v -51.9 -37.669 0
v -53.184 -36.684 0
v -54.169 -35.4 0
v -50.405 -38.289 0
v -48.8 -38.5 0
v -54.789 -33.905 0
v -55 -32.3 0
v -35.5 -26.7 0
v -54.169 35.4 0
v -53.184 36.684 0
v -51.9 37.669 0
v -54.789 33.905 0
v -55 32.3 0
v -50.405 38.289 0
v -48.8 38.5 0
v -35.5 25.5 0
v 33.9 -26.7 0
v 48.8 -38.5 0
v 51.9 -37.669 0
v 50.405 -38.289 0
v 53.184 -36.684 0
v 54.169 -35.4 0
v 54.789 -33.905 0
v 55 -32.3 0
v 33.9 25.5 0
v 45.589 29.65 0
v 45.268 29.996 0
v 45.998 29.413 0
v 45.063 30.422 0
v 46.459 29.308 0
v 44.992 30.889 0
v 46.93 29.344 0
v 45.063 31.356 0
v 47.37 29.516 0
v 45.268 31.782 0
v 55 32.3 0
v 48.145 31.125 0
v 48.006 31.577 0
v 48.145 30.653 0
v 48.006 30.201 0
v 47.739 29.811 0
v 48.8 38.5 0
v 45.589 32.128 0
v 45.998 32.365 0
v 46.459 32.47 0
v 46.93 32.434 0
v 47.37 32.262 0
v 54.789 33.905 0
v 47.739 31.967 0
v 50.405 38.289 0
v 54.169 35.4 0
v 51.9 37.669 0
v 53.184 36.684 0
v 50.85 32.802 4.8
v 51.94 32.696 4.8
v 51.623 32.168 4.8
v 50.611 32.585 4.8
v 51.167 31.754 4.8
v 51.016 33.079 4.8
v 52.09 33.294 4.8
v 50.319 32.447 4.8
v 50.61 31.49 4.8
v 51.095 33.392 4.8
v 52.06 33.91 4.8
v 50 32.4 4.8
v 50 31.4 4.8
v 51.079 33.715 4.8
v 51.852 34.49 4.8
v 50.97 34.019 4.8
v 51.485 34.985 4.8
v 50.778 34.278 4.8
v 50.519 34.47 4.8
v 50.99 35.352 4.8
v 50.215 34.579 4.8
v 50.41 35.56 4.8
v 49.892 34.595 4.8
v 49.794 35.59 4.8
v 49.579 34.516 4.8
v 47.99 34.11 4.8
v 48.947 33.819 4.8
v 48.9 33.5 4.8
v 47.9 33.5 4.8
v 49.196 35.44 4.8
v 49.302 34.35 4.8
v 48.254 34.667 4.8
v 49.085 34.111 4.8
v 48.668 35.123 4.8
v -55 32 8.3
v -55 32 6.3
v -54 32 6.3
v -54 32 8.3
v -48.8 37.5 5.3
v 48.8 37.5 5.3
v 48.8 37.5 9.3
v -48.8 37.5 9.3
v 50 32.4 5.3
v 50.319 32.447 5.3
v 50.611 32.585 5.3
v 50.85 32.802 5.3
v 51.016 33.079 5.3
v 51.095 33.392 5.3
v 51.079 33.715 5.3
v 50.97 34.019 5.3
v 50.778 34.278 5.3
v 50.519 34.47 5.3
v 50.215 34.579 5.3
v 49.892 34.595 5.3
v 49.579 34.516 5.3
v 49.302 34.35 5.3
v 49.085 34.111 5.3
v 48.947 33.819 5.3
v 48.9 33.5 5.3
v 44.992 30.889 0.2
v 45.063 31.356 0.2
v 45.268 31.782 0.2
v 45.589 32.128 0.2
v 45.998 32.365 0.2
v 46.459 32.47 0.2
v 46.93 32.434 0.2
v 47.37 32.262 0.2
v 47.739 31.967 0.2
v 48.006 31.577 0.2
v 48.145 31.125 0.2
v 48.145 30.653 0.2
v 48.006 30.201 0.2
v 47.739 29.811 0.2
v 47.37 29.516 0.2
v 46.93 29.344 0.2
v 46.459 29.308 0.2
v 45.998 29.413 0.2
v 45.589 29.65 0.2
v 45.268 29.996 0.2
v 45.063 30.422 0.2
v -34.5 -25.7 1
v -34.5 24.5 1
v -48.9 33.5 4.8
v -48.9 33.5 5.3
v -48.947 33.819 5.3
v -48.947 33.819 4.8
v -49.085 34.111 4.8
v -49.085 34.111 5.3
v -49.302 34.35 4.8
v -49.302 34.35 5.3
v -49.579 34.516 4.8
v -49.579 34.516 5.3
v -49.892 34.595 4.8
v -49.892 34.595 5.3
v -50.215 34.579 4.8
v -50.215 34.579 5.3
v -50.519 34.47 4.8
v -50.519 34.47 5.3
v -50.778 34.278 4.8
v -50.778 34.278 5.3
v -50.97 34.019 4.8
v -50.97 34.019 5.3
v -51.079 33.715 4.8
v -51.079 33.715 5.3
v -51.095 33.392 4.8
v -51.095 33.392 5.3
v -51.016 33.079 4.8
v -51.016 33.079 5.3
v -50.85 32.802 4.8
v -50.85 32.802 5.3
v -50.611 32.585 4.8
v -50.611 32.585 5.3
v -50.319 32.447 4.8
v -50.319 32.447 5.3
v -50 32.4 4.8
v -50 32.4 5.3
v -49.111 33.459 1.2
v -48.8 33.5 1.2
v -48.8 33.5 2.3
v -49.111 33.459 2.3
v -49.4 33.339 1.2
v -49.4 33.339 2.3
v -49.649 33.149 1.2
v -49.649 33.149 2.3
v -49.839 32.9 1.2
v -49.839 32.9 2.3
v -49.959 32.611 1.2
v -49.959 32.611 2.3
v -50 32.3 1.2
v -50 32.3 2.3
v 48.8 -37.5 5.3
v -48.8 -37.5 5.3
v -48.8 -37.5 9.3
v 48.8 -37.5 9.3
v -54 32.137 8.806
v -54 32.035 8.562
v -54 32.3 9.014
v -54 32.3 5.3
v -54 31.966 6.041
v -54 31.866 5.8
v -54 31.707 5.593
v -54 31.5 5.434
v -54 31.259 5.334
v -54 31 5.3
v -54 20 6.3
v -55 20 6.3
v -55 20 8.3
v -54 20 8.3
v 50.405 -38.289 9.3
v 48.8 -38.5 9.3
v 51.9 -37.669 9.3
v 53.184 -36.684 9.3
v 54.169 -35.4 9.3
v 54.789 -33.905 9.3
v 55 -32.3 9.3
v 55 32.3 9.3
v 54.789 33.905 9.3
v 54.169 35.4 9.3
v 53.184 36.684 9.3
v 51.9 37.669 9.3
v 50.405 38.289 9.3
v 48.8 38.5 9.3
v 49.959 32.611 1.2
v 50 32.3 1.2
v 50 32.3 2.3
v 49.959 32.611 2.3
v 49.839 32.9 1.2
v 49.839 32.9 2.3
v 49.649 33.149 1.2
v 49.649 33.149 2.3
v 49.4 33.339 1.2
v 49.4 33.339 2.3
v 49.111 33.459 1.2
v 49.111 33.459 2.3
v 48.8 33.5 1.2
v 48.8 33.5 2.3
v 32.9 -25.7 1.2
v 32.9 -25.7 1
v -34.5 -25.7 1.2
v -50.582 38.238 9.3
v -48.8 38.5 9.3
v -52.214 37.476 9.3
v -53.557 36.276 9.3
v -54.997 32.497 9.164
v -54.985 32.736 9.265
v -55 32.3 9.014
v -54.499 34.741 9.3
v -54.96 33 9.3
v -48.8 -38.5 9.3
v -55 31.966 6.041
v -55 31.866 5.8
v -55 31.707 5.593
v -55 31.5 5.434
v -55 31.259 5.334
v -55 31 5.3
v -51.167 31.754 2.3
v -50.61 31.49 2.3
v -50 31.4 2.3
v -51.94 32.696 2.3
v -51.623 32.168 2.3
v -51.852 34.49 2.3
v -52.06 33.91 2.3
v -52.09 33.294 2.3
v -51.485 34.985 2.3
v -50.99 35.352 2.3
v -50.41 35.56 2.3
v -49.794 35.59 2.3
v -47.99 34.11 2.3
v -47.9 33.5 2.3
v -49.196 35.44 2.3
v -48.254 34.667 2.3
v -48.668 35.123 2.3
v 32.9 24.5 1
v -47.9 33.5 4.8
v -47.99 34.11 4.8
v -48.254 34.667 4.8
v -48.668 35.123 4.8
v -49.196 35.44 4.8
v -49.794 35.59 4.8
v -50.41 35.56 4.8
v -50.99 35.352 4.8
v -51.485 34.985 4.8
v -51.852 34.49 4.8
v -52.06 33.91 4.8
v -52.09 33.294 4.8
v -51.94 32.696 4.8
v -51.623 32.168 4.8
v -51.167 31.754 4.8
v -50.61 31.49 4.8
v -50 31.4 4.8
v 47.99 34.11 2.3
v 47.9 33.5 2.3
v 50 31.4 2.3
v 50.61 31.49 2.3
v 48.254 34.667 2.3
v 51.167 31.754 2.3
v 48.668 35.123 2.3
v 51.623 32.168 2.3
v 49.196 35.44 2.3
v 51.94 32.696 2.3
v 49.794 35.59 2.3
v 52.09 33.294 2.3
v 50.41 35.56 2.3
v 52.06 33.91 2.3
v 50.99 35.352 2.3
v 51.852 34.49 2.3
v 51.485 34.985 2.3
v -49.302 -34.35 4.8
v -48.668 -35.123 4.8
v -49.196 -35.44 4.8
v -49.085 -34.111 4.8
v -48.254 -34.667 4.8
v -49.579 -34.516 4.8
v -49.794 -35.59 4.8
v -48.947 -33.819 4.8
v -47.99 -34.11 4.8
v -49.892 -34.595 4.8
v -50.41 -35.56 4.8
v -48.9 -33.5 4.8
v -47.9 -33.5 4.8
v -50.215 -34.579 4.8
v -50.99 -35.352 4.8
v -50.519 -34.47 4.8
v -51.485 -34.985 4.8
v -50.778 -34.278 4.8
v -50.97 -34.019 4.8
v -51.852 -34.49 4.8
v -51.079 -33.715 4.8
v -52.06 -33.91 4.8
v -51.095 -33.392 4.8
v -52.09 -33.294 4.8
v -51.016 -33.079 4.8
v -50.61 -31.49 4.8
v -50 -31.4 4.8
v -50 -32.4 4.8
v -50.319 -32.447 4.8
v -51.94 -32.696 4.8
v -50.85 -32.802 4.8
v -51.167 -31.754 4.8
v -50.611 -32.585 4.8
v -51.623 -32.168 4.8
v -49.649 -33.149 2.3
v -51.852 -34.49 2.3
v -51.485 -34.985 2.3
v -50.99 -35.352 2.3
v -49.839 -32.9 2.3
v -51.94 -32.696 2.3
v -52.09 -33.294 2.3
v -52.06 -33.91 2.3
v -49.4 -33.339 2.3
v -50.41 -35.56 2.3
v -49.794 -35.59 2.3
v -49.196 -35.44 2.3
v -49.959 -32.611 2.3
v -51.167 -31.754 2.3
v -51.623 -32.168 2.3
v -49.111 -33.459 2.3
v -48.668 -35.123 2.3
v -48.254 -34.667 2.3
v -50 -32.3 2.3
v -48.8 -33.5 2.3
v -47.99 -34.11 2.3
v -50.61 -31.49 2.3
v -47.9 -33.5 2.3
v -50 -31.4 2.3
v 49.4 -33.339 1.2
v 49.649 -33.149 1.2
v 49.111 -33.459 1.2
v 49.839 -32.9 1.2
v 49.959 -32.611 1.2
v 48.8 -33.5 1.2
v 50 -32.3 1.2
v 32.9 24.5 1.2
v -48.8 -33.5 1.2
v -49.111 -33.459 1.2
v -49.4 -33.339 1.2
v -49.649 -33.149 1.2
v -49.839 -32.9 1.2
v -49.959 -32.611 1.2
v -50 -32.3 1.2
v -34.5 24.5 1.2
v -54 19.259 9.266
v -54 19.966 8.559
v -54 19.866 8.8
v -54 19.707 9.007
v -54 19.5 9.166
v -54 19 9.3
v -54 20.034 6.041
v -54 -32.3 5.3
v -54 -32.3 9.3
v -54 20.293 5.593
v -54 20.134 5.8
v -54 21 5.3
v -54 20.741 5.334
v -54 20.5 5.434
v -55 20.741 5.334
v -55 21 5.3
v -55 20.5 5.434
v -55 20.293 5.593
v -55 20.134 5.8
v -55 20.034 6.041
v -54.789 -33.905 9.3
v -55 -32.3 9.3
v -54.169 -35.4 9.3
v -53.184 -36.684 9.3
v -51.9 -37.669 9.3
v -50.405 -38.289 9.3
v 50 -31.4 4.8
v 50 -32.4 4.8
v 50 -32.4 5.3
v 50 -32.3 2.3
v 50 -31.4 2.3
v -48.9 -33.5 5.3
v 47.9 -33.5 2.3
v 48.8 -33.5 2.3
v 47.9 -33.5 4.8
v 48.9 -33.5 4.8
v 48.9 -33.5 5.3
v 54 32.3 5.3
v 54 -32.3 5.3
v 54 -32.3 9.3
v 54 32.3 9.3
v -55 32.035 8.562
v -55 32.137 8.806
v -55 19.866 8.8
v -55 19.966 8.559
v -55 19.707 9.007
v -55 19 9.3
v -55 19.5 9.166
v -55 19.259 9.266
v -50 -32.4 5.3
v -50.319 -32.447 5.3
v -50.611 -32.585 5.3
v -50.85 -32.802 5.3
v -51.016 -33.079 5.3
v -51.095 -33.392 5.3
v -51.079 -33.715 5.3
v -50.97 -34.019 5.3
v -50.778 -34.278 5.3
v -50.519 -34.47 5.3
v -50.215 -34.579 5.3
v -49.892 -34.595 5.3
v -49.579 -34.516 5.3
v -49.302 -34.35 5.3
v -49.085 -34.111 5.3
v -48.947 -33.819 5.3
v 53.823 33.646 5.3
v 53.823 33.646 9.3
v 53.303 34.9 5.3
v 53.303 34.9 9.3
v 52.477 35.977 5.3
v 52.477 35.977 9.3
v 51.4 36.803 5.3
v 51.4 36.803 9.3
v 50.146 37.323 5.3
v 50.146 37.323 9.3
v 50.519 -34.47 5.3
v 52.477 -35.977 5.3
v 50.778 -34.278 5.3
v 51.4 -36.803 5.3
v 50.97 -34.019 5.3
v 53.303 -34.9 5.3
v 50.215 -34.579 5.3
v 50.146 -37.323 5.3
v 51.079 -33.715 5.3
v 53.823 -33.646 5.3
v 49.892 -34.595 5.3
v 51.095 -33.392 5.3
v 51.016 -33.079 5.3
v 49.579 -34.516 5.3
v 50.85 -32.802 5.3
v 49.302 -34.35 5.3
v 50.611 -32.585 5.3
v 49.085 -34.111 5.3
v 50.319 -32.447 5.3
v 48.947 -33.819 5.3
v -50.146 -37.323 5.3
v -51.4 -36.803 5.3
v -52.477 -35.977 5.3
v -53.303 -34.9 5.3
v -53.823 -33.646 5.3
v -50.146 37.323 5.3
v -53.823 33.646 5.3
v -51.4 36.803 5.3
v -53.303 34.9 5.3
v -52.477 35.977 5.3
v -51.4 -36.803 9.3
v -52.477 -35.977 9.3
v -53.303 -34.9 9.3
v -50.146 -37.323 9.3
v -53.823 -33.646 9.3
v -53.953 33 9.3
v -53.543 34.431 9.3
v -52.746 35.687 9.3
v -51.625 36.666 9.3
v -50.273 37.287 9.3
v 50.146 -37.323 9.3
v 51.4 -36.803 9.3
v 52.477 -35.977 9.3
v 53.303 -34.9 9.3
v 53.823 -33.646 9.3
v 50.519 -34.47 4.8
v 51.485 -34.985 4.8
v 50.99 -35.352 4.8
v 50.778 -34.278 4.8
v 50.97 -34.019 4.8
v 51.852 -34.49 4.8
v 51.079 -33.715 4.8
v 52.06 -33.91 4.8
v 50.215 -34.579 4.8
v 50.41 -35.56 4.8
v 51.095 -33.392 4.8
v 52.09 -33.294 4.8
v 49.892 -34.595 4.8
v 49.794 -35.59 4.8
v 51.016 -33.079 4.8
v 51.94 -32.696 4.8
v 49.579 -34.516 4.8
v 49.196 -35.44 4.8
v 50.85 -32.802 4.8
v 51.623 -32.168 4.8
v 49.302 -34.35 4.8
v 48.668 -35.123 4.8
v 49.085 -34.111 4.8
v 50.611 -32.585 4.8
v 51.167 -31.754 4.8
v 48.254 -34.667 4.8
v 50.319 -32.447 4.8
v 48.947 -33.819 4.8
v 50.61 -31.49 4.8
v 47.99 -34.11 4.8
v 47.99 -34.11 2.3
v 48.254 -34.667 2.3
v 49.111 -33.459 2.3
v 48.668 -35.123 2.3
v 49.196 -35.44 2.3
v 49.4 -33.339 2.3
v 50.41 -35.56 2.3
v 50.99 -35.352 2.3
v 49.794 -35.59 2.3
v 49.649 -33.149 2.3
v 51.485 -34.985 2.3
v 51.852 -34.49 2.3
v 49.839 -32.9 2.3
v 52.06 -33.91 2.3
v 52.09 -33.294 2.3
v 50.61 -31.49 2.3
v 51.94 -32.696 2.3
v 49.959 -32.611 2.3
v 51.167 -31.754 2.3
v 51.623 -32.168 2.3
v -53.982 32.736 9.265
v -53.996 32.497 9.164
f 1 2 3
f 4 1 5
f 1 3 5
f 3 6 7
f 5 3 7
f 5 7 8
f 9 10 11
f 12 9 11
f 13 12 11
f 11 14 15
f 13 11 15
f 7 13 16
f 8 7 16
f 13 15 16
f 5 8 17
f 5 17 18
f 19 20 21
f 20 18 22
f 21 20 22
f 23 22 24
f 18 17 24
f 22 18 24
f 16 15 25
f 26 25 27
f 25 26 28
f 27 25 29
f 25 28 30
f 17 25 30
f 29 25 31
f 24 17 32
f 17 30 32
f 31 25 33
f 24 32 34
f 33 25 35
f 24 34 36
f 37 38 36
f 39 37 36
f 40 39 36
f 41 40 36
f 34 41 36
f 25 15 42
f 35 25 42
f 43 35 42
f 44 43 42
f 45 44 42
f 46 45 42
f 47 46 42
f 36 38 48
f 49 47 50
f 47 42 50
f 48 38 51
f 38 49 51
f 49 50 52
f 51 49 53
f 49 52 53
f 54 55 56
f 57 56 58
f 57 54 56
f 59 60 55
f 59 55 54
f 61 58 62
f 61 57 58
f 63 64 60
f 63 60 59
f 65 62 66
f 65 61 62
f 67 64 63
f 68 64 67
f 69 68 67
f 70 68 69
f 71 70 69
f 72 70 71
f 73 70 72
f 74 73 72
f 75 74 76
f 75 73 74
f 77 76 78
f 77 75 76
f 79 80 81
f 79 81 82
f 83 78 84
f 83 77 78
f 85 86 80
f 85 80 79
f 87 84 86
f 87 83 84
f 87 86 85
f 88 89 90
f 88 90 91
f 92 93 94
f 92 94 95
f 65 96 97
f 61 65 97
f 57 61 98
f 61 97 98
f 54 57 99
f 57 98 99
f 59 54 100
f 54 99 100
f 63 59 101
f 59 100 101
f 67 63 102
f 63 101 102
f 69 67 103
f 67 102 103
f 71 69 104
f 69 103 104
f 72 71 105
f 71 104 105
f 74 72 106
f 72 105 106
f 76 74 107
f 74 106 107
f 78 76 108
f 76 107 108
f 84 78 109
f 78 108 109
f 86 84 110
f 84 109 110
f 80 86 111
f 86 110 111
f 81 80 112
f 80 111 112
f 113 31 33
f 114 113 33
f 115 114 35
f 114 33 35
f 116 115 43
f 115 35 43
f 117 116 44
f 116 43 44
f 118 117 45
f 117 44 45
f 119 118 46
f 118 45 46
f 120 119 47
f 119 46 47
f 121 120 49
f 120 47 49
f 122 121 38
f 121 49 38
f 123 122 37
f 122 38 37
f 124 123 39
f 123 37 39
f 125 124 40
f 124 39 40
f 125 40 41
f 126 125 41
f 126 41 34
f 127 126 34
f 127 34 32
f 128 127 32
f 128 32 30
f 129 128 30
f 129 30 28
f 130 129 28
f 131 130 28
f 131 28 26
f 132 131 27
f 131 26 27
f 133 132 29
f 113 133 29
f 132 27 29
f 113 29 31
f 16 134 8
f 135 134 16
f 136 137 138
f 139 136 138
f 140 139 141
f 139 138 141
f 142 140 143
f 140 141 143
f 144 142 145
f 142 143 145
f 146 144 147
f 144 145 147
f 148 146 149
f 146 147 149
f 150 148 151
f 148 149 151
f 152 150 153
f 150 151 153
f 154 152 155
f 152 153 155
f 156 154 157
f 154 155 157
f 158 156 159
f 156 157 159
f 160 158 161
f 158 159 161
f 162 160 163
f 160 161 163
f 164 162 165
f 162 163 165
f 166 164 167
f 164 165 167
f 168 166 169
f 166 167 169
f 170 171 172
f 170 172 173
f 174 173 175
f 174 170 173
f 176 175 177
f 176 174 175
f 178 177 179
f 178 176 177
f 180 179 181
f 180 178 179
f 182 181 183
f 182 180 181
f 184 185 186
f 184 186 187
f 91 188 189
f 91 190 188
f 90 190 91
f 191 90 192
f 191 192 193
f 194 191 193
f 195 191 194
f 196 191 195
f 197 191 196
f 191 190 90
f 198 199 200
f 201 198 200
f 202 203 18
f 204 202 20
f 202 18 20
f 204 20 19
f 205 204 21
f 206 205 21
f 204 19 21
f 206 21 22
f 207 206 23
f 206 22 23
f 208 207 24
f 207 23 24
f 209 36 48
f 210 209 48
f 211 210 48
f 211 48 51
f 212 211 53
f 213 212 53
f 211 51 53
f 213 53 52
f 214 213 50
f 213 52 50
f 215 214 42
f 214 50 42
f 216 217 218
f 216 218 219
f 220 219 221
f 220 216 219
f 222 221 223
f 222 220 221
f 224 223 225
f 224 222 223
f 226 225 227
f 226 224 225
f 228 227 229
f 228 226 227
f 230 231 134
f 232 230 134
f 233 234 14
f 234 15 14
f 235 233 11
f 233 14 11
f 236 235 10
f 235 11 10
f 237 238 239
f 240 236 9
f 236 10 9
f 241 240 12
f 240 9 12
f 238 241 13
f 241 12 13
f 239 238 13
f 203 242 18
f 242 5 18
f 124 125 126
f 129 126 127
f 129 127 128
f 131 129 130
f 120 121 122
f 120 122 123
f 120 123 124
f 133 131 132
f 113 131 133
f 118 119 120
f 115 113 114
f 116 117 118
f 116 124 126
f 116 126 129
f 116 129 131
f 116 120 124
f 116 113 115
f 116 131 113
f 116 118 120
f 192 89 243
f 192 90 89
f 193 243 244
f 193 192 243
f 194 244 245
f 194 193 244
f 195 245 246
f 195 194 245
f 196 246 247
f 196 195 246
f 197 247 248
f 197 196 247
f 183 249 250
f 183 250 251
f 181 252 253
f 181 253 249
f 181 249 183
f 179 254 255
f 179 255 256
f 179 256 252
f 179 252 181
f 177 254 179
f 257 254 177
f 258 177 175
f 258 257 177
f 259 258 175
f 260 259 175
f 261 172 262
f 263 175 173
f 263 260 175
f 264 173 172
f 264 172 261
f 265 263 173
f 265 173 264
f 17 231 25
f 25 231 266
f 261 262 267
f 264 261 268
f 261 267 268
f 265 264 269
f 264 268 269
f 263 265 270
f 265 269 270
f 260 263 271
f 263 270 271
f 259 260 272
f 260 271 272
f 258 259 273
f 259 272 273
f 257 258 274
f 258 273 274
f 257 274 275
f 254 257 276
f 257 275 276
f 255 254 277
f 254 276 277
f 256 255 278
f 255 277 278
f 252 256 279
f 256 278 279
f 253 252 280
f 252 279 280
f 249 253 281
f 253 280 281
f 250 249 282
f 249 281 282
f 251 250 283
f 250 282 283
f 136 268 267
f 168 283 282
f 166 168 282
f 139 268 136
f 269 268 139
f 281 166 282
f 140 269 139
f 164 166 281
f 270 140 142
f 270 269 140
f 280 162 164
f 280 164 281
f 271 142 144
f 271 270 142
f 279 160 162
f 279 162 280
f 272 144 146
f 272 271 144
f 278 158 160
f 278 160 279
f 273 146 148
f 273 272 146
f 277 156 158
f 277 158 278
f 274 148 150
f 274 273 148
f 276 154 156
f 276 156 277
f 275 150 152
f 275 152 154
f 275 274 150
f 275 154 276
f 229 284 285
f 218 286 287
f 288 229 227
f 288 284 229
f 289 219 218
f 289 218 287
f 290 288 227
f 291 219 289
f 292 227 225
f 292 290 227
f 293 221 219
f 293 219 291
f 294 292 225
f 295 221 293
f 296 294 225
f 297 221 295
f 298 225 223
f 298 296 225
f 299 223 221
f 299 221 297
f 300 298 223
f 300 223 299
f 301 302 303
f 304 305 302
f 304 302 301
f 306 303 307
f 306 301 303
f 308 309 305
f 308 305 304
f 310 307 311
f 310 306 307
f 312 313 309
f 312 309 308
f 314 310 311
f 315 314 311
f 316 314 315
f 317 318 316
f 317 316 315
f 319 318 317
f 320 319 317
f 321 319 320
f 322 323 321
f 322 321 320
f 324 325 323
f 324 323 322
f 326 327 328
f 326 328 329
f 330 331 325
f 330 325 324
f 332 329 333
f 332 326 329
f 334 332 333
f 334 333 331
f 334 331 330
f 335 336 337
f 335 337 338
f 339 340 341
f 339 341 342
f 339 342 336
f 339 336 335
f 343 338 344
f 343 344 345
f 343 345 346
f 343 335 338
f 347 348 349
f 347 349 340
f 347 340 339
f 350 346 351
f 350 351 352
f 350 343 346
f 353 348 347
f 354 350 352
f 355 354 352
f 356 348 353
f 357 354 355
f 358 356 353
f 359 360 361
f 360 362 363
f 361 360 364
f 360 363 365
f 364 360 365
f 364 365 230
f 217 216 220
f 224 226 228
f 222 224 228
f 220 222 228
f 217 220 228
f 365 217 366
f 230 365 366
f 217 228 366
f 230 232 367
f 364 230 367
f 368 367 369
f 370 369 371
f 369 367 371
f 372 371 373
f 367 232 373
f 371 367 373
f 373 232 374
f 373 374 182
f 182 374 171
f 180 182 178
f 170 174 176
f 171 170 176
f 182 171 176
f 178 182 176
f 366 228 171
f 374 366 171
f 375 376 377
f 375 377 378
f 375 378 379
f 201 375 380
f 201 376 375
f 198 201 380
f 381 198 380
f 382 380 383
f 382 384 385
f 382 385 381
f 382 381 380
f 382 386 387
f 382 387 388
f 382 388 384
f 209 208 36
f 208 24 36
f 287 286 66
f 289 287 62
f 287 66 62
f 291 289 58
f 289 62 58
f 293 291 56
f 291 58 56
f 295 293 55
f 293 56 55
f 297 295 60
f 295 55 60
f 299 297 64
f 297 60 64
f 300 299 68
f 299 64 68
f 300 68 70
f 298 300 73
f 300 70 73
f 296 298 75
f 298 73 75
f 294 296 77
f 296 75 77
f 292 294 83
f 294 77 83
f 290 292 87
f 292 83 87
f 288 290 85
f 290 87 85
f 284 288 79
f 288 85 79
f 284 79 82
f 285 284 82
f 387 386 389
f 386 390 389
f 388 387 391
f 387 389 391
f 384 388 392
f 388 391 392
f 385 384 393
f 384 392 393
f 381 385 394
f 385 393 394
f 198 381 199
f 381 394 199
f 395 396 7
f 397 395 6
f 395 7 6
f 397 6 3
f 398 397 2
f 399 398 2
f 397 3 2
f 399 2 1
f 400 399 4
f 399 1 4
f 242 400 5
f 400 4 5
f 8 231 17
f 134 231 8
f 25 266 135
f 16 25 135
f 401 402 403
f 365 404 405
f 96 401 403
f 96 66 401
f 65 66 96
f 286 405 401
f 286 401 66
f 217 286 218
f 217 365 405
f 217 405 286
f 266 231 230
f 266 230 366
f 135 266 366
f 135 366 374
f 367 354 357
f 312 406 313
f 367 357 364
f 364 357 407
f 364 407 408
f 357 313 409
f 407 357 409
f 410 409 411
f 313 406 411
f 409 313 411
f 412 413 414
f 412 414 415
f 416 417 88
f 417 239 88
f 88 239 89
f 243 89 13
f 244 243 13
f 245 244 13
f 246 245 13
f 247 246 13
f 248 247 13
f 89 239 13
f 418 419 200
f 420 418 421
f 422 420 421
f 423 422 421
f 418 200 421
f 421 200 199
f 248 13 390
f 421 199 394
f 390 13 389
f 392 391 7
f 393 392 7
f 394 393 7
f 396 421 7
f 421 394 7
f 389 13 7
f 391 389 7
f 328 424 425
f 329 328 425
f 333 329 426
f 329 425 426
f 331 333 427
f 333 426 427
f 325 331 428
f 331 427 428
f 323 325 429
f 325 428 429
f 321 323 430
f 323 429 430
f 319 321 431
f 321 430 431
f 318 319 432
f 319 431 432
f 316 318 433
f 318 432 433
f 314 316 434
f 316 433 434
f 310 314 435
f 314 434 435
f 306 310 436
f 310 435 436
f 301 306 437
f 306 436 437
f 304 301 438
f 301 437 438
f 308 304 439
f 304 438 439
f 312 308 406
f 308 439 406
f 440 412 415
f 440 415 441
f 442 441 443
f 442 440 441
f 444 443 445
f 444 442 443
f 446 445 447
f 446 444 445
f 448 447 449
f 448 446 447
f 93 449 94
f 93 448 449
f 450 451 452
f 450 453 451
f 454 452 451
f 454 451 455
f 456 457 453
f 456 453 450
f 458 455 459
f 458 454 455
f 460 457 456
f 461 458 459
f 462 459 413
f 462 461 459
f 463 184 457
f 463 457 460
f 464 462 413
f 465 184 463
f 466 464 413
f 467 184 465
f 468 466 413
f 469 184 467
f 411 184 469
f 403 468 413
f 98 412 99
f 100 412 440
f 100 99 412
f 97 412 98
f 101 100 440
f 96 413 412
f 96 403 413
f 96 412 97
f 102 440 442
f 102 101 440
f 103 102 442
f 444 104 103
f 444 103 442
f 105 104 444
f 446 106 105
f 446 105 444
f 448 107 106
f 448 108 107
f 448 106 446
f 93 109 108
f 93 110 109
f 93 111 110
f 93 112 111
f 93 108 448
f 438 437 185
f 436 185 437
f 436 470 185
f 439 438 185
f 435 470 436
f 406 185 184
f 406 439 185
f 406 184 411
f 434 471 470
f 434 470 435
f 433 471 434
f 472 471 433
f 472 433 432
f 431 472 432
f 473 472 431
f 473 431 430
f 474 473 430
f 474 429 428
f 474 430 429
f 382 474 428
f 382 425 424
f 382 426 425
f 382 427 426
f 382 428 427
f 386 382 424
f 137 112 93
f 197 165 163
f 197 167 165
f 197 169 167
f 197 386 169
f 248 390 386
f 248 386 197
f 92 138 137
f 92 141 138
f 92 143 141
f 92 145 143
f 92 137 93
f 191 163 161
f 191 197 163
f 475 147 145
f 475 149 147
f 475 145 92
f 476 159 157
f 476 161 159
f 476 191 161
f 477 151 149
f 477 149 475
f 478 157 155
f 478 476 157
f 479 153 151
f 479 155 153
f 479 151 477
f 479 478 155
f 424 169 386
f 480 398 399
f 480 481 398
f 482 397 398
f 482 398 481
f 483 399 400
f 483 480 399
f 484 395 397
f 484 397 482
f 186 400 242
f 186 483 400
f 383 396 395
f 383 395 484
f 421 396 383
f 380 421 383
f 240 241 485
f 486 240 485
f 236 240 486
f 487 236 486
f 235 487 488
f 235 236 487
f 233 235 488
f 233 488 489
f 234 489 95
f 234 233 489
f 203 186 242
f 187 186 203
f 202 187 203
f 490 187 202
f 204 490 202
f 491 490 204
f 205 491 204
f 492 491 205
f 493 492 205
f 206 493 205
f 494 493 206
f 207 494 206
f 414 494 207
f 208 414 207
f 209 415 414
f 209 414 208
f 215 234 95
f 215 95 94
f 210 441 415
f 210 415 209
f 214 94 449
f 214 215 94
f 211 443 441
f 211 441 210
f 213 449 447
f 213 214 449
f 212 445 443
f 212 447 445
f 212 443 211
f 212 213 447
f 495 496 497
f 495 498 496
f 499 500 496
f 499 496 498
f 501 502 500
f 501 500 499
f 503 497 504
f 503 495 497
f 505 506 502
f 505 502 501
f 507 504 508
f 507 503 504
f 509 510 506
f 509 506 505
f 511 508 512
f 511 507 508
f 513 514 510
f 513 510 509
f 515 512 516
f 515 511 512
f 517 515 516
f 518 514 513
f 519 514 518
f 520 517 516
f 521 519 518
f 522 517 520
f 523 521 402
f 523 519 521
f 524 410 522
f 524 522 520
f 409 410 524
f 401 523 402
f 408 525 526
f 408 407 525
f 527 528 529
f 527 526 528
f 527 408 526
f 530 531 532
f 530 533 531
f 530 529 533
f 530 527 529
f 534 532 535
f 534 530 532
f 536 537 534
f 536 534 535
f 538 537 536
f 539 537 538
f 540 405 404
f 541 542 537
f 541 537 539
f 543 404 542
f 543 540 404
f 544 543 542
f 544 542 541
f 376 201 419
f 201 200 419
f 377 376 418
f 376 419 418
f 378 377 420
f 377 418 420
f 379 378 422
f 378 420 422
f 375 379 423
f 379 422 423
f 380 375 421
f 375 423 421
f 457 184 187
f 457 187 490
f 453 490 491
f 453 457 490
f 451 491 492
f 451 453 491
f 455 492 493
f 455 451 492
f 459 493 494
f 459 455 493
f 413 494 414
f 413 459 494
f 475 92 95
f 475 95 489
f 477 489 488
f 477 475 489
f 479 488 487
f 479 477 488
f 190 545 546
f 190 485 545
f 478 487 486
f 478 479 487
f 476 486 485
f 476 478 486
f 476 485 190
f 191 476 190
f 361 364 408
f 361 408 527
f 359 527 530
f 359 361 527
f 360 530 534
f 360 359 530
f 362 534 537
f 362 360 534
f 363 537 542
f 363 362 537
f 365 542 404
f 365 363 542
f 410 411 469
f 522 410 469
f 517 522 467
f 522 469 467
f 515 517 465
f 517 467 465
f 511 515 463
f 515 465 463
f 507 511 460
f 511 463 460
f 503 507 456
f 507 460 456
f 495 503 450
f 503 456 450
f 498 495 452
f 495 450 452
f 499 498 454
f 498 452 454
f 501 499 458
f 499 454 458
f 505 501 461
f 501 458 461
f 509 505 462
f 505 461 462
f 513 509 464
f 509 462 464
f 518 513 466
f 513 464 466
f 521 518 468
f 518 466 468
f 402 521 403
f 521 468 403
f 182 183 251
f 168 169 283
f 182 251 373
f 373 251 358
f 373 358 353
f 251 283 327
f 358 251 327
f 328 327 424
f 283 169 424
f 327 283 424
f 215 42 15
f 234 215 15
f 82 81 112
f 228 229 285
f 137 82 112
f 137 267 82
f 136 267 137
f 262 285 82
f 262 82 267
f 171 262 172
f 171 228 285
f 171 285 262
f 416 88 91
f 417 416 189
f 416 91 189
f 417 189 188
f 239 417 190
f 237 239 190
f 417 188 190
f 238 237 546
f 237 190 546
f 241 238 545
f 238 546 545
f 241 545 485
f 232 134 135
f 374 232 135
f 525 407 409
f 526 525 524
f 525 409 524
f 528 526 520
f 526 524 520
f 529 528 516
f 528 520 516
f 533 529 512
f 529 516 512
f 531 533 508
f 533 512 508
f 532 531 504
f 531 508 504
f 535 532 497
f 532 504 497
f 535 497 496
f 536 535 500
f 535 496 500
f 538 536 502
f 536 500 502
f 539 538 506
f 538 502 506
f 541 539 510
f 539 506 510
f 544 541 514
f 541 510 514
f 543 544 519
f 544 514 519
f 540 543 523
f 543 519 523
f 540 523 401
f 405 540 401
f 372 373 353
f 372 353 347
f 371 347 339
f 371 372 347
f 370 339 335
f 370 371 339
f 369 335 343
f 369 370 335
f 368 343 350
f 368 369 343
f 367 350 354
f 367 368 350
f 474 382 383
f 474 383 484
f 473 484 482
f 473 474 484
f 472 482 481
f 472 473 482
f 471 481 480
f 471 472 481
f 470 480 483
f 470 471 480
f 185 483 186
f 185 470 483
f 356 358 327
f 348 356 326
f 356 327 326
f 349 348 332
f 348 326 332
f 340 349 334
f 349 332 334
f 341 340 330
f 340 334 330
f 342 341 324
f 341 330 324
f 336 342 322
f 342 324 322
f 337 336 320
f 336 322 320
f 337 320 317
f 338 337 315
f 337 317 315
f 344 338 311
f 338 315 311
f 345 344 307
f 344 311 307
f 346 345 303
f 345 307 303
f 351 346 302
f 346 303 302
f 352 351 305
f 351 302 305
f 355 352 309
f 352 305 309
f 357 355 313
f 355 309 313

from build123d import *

# Parameters (mm, degrees)
EXTRUDE_1_DEPTH     = 1.2
EXTRUDE_2_DEPTH     = 5.3
SKETCH_3_W          = 67.4
SKETCH_3_H          = 50.2
CUT_EXTRUDE_1_DEPTH = 68.344932994
CHAMFER_1_SIZE      = 1
SKETCH_5_R          = 1.585078886
CUT_EXTRUDE_2_DEPTH = 0.2
SKETCH_6_R          = 2.1
CUT_EXTRUDE_3_DEPTH = 3
EXTRUDE_3_DEPTH     = 0.5
EXTRUDE_4_DEPTH     = 4
SKETCH_10_W         = 4
SKETCH_10_H         = 12
CUT_EXTRUDE_4_DEPTH = 5
FILLET_1_R          = 1


with BuildPart() as part:
    # Sketch 1 → Extrude 1 (new body)
    with BuildSketch(Plane.XY):
        with BuildLine():
            Line((48.8, -33.5), (-48.8, -33.5))
            ThreePointArc((-48.8, -33.5), (-49.648528137, -33.148528137), (-50, -32.3))
            Line((-50, -32.3), (-50, 32.3))
            ThreePointArc((-50, 32.3), (-49.648528137, 33.148528137), (-48.8, 33.5))
            Line((-48.8, 33.5), (48.8, 33.5))
            ThreePointArc((48.8, 33.5), (49.648528137, 33.148528137), (50, 32.3))
            Line((50, 32.3), (50, -32.3))
            ThreePointArc((50, -32.3), (49.648528137, -33.148528137), (48.8, -33.5))
        make_face()
    extrude(amount=EXTRUDE_1_DEPTH)

    # Sketch 2 → Extrude 2 (add)
    with BuildSketch(Plane.XY):
        with BuildLine():
            Line((-48.8, -38.5), (48.8, -38.5))
            ThreePointArc((48.8, -38.5), (53.184062043, -36.684062043), (55, -32.3))
            Line((55, -32.3), (55, 32.3))
            ThreePointArc((55, 32.3), (53.184062043, 36.684062043), (48.8, 38.5))
            Line((48.8, 38.5), (-48.8, 38.5))
            ThreePointArc((-48.8, 38.5), (-53.184062043, 36.684062043), (-55, 32.3))
            Line((-55, 32.3), (-55, -32.3))
            ThreePointArc((-55, -32.3), (-53.184062043, -36.684062043), (-48.8, -38.5))
        make_face()
        with BuildLine():
            Line((50, -32.3), (50, 32.3))
            ThreePointArc((50, 32.3), (49.648528137, 33.148528137), (48.8, 33.5))
            Line((48.8, 33.5), (-48.8, 33.5))
            ThreePointArc((-48.8, 33.5), (-49.648528137, 33.148528137), (-50, 32.3))
            Line((-50, 32.3), (-50, -32.3))
            ThreePointArc((-50, -32.3), (-49.648528137, -33.148528137), (-48.8, -33.5))
            Line((-48.8, -33.5), (48.8, -33.5))
            ThreePointArc((48.8, -33.5), (49.648528137, -33.148528137), (50, -32.3))
        make_face(mode=Mode.SUBTRACT)
    extrude(amount=EXTRUDE_2_DEPTH)

    # Sketch 3 → Cut-Extrude 1 (cut, through all)
    with BuildSketch(Plane(origin=(0, 0, 0), x_dir=(-1, 0, 0), z_dir=(0, 0, -1))):
        with Locations((0.8, -0.6)):
            Rectangle(SKETCH_3_W, SKETCH_3_H)
    extrude(amount=-CUT_EXTRUDE_1_DEPTH, mode=Mode.SUBTRACT)

    # Chamfer 1
    chamfer_1_edges = [part.edges().sort_by_distance(p)[0] for p in [
        (32.9, -0.6, 0),
        (-0.8, -25.7, 0),
        (-34.5, -0.6, 0),
        (-0.8, 24.5, 0),
    ]]
    chamfer(chamfer_1_edges, length=CHAMFER_1_SIZE)

    # Sketch 5 → Cut-Extrude 2 (cut)
    with BuildSketch(Plane(origin=(0, 0, 0), x_dir=(-1, 0, 0), z_dir=(0, 0, -1))):
        with Locations((-46.577472533, 30.889007125)):
            Circle(SKETCH_5_R)
    extrude(amount=-CUT_EXTRUDE_2_DEPTH, mode=Mode.SUBTRACT)

    # Sketch 6 → Cut-Extrude 3 (cut)
    with BuildSketch(Plane.XY.offset(5.3)):
        with Locations((-50, -33.5)):
            Circle(SKETCH_6_R)
        with Locations((50, -33.5)):
            Circle(SKETCH_6_R)
        with Locations((50, 33.5)):
            Circle(SKETCH_6_R)
        with Locations((-50, 33.5)):
            Circle(SKETCH_6_R)
    extrude(amount=-CUT_EXTRUDE_3_DEPTH, mode=Mode.SUBTRACT)

    # Sketch 8 → Extrude 3 (add)
    with BuildSketch(Plane.XY.offset(5.3)):
        with BuildLine():
            Line((-50, -31.4), (-50, -32.4))
            ThreePointArc((-50, -32.4), (-50.777817459, -34.277817459), (-48.9, -33.5))
            Line((-48.9, -33.5), (-47.9, -33.5))
            ThreePointArc((-47.9, -33.5), (-51.48492424, -34.98492424), (-50, -31.4))
        make_face()
        with BuildLine():
            Line((47.9, -33.5), (48.9, -33.5))
            ThreePointArc((48.9, -33.5), (50.777817459, -34.277817459), (50, -32.4))
            Line((50, -32.4), (50, -31.4))
            ThreePointArc((50, -31.4), (51.48492424, -34.98492424), (47.9, -33.5))
        make_face()
        with BuildLine():
            Line((-47.9, 33.5), (-48.9, 33.5))
            ThreePointArc((-48.9, 33.5), (-50.777817459, 34.277817459), (-50, 32.4))
            Line((-50, 32.4), (-50, 31.4))
            ThreePointArc((-50, 31.4), (-51.48492424, 34.98492424), (-47.9, 33.5))
        make_face()
        with BuildLine():
            Line((50, 31.4), (50, 32.4))
            ThreePointArc((50, 32.4), (50.777817459, 34.277817459), (48.9, 33.5))
            Line((48.9, 33.5), (47.9, 33.5))
            ThreePointArc((47.9, 33.5), (51.48492424, 34.98492424), (50, 31.4))
        make_face()
    extrude(amount=-EXTRUDE_3_DEPTH)

    # Sketch 9 → Extrude 4 (add)
    with BuildSketch(Plane.XY.offset(5.3)):
        with BuildLine():
            Line((-55, 32.3), (-55, -32.3))
            ThreePointArc((-55, -32.3), (-53.184062043, -36.684062043), (-48.8, -38.5))
            Line((-48.8, -38.5), (48.8, -38.5))
            ThreePointArc((48.8, -38.5), (53.184062043, -36.684062043), (55, -32.3))
            Line((55, -32.3), (55, 32.3))
            ThreePointArc((55, 32.3), (53.184062043, 36.684062043), (48.8, 38.5))
            Line((48.8, 38.5), (-48.8, 38.5))
            ThreePointArc((-48.8, 38.5), (-53.184062043, 36.684062043), (-55, 32.3))
        make_face()
        with BuildLine():
            Line((-54, 32.3), (-54, -32.3))
            ThreePointArc((-54, -32.3), (-52.476955262, -35.976955262), (-48.8, -37.5))
            Line((-48.8, -37.5), (48.8, -37.5))
            ThreePointArc((48.8, -37.5), (52.476955262, -35.976955262), (54, -32.3))
            Line((54, -32.3), (54, 32.3))
            ThreePointArc((54, 32.3), (52.476955262, 35.976955262), (48.8, 37.5))
            Line((48.8, 37.5), (-48.8, 37.5))
            ThreePointArc((-48.8, 37.5), (-52.476955262, 35.976955262), (-54, 32.3))
        make_face(mode=Mode.SUBTRACT)
    extrude(amount=EXTRUDE_4_DEPTH)

    # Sketch 10 → Cut-Extrude 4 (cut, symmetric)
    with BuildSketch(Plane.ZY.offset(55)):
        with Locations((7.3, 26)):
            Rectangle(SKETCH_10_W, SKETCH_10_H)
    extrude(amount=CUT_EXTRUDE_4_DEPTH, both=True, mode=Mode.SUBTRACT)

    # Fillet 1
    fillet_1_edges = [part.edges().sort_by_distance(p)[0] for p in [
        (-54.5, 32, 9.3),
        (-54.5, 20, 9.3),
        (-54.5, 20, 5.3),
        (-54.5, 32, 5.3),
    ]]
    fillet(fillet_1_edges, radius=FILLET_1_R)


solid = part.part
